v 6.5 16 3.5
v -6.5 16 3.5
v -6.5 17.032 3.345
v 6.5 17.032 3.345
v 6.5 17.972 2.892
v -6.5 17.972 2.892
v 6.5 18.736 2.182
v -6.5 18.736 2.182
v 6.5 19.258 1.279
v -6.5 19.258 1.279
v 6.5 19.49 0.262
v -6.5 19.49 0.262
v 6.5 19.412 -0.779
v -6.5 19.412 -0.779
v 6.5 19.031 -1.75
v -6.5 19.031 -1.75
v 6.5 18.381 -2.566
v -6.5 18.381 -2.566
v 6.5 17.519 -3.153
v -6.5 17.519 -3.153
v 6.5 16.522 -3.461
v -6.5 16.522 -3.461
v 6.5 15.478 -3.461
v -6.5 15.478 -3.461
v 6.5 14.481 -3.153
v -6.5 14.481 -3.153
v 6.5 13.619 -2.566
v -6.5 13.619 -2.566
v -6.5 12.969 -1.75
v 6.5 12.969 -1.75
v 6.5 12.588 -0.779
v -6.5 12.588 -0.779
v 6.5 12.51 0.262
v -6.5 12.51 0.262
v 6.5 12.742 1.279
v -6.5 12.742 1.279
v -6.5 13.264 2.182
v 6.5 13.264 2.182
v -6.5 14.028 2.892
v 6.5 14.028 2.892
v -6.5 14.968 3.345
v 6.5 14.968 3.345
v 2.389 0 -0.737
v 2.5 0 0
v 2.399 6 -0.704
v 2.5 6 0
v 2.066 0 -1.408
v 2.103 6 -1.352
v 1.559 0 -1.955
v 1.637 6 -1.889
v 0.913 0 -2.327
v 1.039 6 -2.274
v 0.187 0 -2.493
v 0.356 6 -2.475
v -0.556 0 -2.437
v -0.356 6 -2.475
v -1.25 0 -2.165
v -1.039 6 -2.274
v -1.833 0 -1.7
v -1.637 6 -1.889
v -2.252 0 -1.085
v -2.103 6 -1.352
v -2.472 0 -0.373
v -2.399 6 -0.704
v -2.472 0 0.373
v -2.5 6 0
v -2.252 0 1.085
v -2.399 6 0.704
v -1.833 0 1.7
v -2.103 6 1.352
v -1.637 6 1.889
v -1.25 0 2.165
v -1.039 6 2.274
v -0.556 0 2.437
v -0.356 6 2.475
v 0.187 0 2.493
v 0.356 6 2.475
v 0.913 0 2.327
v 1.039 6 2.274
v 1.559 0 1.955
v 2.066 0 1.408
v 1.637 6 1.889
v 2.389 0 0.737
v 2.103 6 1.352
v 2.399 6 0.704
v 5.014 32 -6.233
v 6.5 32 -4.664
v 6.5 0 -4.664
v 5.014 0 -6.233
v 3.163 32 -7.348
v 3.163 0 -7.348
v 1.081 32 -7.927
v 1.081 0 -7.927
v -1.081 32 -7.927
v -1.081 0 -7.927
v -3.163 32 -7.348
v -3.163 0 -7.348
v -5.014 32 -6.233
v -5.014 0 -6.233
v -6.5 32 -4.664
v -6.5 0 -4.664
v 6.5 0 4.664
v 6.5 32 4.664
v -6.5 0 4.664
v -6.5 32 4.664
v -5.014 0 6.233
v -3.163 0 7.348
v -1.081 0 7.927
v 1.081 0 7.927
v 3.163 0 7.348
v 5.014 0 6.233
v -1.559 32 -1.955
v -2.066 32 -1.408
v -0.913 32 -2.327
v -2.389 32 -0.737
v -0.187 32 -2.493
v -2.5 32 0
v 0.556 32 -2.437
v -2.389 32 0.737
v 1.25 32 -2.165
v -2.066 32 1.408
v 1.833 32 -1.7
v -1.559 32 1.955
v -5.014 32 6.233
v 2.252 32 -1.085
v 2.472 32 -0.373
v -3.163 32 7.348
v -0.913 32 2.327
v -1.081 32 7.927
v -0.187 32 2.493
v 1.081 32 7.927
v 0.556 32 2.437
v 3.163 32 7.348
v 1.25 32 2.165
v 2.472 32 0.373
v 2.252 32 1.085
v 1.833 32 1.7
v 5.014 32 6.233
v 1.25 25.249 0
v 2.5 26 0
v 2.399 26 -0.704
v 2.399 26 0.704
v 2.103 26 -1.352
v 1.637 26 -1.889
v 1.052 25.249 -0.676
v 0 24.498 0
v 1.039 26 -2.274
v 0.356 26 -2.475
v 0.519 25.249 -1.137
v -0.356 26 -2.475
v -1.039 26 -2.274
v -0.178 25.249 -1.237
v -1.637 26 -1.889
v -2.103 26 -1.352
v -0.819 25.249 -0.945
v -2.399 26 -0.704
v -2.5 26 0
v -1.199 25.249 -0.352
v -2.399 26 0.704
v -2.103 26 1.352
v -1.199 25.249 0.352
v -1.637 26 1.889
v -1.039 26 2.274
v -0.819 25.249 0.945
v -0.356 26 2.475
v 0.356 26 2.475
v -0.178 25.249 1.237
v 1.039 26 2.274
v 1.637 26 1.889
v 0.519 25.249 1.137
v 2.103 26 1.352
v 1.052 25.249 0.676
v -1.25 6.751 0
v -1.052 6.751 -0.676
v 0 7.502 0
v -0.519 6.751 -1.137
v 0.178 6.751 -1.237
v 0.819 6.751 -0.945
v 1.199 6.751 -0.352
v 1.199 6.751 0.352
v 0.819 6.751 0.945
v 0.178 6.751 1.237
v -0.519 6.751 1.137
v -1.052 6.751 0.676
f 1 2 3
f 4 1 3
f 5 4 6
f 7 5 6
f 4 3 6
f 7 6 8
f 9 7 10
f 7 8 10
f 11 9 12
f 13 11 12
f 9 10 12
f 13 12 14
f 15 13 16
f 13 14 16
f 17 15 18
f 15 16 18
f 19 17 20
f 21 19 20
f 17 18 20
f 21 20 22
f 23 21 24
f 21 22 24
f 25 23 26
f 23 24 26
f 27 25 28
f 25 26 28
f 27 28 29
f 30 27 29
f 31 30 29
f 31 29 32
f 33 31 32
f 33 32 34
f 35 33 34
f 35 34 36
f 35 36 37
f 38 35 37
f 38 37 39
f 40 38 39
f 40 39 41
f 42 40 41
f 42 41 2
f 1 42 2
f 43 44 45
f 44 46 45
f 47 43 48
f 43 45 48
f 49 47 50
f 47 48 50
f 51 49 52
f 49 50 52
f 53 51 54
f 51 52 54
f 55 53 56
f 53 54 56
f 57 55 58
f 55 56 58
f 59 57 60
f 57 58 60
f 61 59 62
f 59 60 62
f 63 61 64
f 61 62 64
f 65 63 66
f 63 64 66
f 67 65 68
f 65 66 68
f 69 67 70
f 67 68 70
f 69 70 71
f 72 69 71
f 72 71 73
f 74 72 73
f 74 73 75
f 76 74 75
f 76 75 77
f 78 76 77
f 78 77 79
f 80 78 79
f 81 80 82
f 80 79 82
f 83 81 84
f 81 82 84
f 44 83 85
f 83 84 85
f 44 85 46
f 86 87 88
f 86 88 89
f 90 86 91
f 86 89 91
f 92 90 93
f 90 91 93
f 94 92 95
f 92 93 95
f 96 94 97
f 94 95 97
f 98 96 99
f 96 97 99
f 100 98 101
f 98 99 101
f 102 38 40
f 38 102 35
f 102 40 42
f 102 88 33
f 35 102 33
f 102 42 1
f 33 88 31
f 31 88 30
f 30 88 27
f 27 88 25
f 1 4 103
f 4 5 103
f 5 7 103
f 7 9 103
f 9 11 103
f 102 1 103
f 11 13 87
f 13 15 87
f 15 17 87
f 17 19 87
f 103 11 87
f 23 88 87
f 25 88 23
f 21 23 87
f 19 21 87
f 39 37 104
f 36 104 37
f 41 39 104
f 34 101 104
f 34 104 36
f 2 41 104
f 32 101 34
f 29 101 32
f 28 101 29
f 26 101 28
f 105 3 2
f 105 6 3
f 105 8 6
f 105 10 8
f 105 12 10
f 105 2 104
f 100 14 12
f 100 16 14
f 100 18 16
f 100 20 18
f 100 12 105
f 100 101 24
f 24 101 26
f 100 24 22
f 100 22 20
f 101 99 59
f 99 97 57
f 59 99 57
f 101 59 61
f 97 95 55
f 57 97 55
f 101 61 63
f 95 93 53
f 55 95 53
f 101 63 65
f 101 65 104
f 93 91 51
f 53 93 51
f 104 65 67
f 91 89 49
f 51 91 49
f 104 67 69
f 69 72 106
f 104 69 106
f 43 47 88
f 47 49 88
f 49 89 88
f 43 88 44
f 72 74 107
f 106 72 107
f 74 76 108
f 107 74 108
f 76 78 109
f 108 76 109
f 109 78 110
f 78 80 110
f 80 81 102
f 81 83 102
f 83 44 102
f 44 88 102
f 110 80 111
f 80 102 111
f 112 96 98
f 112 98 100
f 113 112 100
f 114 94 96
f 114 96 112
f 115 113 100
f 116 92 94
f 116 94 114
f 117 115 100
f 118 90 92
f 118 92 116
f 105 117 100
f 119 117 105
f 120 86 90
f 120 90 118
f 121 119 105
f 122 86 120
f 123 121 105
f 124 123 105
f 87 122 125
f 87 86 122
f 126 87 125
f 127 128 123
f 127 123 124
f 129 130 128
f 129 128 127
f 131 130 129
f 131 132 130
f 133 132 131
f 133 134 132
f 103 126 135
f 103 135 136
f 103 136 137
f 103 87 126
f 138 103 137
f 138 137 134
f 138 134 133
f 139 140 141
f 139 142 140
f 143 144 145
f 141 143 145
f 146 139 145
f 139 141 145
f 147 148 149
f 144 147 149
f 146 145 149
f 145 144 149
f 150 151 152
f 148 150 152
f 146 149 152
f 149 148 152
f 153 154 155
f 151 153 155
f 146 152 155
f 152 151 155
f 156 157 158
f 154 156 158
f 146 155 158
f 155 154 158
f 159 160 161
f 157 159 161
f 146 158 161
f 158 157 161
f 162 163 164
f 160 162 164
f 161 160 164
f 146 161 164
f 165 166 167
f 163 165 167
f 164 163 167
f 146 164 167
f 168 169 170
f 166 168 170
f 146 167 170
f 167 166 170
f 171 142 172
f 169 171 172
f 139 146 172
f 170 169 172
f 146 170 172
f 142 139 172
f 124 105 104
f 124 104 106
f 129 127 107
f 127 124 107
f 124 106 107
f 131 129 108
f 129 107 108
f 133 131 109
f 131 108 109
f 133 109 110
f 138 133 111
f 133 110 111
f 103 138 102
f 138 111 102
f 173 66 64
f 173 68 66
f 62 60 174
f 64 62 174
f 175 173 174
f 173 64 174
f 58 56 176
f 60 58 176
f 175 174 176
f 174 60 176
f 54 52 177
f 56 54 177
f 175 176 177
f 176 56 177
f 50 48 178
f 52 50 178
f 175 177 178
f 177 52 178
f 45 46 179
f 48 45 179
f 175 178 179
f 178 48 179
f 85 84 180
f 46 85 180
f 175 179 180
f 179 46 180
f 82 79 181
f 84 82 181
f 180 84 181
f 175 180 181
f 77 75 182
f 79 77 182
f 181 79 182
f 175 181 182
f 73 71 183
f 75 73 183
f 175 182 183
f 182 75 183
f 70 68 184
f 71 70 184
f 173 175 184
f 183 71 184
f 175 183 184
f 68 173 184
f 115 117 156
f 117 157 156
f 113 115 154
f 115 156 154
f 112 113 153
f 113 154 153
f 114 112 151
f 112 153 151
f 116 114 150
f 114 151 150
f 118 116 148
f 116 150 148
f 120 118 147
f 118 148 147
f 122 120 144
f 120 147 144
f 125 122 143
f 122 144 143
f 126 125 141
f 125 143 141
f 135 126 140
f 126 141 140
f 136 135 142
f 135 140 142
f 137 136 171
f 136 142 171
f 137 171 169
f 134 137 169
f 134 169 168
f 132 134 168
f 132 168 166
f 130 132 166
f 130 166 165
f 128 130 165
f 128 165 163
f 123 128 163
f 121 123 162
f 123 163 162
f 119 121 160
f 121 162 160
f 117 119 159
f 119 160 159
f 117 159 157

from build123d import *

# Parameters (mm, degrees)
SKETCH_1_R               = 8
EXTRUDE_1_DEPTH          = 32
M6X1_0_1_D               = 5
M6X1_0_1_DEPTH           = 6
M6X1_0_1_TIP             = 1.502151548
M6X1_0_2_D               = 5
M6X1_0_2_DEPTH           = 6
M6X1_0_2_TIP             = 1.502151548
CUT_EXTRUDE_2_DEPTH      = 10
CUT_EXTRUDE_2_DEPTH_BACK = 10
SKETCH_10_W              = 1.5
SKETCH_10_H              = 35
M8X1_0_1_D               = 7


with BuildPart() as part:
    # 草图1 → 凸台-拉伸1 (new body)
    with BuildSketch(Plane(origin=(0, 0, 0), x_dir=(1, 0, 0), z_dir=(0, 1, 0))):
        Circle(SKETCH_1_R)
    extrude(amount=EXTRUDE_1_DEPTH)

    # M6x1.0 螺纹孔1
    with Locations(Plane(origin=(0, 32, 0), x_dir=(1, 0, 0), z_dir=(0, 1, 0))):
        with Locations((0, 0)):
            Hole(M6X1_0_1_D / 2, depth=M6X1_0_1_DEPTH)
            with Locations((0, 0, -(M6X1_0_1_DEPTH + M6X1_0_1_TIP / 2))):  # 118° drill point
                Cone(0, M6X1_0_1_D / 2, M6X1_0_1_TIP, mode=Mode.SUBTRACT)

    # M6x1.0 螺纹孔2
    with Locations(Plane(origin=(0, 0, 0), x_dir=(-1, 0, 0), z_dir=(0, -1, 0))):
        with Locations((0, 0)):
            Hole(M6X1_0_2_D / 2, depth=M6X1_0_2_DEPTH)
            with Locations((0, 0, -(M6X1_0_2_DEPTH + M6X1_0_2_TIP / 2))):  # 118° drill point
                Cone(0, M6X1_0_2_D / 2, M6X1_0_2_TIP, mode=Mode.SUBTRACT)

    # 草图10 → 切除-拉伸2 (cut, two sides: drawn at the far end of the back side and taken through both)
    with BuildSketch(Plane.XY.offset(-CUT_EXTRUDE_2_DEPTH_BACK)):
        with Locations((7.25, 16)):
            Rectangle(SKETCH_10_W, SKETCH_10_H)
        with Locations((-7.25, 16)):
            Rectangle(SKETCH_10_W, SKETCH_10_H)
    extrude(amount=CUT_EXTRUDE_2_DEPTH + CUT_EXTRUDE_2_DEPTH_BACK, mode=Mode.SUBTRACT)

    # M8x1.0 螺纹孔1 (through all)
    with Locations(Plane(origin=(6.5, 0, 0), x_dir=(0, 0, -1), z_dir=(1, 0, 0))):
        with Locations((0, 16)):
            Hole(M8X1_0_1_D / 2)


solid = part.part
